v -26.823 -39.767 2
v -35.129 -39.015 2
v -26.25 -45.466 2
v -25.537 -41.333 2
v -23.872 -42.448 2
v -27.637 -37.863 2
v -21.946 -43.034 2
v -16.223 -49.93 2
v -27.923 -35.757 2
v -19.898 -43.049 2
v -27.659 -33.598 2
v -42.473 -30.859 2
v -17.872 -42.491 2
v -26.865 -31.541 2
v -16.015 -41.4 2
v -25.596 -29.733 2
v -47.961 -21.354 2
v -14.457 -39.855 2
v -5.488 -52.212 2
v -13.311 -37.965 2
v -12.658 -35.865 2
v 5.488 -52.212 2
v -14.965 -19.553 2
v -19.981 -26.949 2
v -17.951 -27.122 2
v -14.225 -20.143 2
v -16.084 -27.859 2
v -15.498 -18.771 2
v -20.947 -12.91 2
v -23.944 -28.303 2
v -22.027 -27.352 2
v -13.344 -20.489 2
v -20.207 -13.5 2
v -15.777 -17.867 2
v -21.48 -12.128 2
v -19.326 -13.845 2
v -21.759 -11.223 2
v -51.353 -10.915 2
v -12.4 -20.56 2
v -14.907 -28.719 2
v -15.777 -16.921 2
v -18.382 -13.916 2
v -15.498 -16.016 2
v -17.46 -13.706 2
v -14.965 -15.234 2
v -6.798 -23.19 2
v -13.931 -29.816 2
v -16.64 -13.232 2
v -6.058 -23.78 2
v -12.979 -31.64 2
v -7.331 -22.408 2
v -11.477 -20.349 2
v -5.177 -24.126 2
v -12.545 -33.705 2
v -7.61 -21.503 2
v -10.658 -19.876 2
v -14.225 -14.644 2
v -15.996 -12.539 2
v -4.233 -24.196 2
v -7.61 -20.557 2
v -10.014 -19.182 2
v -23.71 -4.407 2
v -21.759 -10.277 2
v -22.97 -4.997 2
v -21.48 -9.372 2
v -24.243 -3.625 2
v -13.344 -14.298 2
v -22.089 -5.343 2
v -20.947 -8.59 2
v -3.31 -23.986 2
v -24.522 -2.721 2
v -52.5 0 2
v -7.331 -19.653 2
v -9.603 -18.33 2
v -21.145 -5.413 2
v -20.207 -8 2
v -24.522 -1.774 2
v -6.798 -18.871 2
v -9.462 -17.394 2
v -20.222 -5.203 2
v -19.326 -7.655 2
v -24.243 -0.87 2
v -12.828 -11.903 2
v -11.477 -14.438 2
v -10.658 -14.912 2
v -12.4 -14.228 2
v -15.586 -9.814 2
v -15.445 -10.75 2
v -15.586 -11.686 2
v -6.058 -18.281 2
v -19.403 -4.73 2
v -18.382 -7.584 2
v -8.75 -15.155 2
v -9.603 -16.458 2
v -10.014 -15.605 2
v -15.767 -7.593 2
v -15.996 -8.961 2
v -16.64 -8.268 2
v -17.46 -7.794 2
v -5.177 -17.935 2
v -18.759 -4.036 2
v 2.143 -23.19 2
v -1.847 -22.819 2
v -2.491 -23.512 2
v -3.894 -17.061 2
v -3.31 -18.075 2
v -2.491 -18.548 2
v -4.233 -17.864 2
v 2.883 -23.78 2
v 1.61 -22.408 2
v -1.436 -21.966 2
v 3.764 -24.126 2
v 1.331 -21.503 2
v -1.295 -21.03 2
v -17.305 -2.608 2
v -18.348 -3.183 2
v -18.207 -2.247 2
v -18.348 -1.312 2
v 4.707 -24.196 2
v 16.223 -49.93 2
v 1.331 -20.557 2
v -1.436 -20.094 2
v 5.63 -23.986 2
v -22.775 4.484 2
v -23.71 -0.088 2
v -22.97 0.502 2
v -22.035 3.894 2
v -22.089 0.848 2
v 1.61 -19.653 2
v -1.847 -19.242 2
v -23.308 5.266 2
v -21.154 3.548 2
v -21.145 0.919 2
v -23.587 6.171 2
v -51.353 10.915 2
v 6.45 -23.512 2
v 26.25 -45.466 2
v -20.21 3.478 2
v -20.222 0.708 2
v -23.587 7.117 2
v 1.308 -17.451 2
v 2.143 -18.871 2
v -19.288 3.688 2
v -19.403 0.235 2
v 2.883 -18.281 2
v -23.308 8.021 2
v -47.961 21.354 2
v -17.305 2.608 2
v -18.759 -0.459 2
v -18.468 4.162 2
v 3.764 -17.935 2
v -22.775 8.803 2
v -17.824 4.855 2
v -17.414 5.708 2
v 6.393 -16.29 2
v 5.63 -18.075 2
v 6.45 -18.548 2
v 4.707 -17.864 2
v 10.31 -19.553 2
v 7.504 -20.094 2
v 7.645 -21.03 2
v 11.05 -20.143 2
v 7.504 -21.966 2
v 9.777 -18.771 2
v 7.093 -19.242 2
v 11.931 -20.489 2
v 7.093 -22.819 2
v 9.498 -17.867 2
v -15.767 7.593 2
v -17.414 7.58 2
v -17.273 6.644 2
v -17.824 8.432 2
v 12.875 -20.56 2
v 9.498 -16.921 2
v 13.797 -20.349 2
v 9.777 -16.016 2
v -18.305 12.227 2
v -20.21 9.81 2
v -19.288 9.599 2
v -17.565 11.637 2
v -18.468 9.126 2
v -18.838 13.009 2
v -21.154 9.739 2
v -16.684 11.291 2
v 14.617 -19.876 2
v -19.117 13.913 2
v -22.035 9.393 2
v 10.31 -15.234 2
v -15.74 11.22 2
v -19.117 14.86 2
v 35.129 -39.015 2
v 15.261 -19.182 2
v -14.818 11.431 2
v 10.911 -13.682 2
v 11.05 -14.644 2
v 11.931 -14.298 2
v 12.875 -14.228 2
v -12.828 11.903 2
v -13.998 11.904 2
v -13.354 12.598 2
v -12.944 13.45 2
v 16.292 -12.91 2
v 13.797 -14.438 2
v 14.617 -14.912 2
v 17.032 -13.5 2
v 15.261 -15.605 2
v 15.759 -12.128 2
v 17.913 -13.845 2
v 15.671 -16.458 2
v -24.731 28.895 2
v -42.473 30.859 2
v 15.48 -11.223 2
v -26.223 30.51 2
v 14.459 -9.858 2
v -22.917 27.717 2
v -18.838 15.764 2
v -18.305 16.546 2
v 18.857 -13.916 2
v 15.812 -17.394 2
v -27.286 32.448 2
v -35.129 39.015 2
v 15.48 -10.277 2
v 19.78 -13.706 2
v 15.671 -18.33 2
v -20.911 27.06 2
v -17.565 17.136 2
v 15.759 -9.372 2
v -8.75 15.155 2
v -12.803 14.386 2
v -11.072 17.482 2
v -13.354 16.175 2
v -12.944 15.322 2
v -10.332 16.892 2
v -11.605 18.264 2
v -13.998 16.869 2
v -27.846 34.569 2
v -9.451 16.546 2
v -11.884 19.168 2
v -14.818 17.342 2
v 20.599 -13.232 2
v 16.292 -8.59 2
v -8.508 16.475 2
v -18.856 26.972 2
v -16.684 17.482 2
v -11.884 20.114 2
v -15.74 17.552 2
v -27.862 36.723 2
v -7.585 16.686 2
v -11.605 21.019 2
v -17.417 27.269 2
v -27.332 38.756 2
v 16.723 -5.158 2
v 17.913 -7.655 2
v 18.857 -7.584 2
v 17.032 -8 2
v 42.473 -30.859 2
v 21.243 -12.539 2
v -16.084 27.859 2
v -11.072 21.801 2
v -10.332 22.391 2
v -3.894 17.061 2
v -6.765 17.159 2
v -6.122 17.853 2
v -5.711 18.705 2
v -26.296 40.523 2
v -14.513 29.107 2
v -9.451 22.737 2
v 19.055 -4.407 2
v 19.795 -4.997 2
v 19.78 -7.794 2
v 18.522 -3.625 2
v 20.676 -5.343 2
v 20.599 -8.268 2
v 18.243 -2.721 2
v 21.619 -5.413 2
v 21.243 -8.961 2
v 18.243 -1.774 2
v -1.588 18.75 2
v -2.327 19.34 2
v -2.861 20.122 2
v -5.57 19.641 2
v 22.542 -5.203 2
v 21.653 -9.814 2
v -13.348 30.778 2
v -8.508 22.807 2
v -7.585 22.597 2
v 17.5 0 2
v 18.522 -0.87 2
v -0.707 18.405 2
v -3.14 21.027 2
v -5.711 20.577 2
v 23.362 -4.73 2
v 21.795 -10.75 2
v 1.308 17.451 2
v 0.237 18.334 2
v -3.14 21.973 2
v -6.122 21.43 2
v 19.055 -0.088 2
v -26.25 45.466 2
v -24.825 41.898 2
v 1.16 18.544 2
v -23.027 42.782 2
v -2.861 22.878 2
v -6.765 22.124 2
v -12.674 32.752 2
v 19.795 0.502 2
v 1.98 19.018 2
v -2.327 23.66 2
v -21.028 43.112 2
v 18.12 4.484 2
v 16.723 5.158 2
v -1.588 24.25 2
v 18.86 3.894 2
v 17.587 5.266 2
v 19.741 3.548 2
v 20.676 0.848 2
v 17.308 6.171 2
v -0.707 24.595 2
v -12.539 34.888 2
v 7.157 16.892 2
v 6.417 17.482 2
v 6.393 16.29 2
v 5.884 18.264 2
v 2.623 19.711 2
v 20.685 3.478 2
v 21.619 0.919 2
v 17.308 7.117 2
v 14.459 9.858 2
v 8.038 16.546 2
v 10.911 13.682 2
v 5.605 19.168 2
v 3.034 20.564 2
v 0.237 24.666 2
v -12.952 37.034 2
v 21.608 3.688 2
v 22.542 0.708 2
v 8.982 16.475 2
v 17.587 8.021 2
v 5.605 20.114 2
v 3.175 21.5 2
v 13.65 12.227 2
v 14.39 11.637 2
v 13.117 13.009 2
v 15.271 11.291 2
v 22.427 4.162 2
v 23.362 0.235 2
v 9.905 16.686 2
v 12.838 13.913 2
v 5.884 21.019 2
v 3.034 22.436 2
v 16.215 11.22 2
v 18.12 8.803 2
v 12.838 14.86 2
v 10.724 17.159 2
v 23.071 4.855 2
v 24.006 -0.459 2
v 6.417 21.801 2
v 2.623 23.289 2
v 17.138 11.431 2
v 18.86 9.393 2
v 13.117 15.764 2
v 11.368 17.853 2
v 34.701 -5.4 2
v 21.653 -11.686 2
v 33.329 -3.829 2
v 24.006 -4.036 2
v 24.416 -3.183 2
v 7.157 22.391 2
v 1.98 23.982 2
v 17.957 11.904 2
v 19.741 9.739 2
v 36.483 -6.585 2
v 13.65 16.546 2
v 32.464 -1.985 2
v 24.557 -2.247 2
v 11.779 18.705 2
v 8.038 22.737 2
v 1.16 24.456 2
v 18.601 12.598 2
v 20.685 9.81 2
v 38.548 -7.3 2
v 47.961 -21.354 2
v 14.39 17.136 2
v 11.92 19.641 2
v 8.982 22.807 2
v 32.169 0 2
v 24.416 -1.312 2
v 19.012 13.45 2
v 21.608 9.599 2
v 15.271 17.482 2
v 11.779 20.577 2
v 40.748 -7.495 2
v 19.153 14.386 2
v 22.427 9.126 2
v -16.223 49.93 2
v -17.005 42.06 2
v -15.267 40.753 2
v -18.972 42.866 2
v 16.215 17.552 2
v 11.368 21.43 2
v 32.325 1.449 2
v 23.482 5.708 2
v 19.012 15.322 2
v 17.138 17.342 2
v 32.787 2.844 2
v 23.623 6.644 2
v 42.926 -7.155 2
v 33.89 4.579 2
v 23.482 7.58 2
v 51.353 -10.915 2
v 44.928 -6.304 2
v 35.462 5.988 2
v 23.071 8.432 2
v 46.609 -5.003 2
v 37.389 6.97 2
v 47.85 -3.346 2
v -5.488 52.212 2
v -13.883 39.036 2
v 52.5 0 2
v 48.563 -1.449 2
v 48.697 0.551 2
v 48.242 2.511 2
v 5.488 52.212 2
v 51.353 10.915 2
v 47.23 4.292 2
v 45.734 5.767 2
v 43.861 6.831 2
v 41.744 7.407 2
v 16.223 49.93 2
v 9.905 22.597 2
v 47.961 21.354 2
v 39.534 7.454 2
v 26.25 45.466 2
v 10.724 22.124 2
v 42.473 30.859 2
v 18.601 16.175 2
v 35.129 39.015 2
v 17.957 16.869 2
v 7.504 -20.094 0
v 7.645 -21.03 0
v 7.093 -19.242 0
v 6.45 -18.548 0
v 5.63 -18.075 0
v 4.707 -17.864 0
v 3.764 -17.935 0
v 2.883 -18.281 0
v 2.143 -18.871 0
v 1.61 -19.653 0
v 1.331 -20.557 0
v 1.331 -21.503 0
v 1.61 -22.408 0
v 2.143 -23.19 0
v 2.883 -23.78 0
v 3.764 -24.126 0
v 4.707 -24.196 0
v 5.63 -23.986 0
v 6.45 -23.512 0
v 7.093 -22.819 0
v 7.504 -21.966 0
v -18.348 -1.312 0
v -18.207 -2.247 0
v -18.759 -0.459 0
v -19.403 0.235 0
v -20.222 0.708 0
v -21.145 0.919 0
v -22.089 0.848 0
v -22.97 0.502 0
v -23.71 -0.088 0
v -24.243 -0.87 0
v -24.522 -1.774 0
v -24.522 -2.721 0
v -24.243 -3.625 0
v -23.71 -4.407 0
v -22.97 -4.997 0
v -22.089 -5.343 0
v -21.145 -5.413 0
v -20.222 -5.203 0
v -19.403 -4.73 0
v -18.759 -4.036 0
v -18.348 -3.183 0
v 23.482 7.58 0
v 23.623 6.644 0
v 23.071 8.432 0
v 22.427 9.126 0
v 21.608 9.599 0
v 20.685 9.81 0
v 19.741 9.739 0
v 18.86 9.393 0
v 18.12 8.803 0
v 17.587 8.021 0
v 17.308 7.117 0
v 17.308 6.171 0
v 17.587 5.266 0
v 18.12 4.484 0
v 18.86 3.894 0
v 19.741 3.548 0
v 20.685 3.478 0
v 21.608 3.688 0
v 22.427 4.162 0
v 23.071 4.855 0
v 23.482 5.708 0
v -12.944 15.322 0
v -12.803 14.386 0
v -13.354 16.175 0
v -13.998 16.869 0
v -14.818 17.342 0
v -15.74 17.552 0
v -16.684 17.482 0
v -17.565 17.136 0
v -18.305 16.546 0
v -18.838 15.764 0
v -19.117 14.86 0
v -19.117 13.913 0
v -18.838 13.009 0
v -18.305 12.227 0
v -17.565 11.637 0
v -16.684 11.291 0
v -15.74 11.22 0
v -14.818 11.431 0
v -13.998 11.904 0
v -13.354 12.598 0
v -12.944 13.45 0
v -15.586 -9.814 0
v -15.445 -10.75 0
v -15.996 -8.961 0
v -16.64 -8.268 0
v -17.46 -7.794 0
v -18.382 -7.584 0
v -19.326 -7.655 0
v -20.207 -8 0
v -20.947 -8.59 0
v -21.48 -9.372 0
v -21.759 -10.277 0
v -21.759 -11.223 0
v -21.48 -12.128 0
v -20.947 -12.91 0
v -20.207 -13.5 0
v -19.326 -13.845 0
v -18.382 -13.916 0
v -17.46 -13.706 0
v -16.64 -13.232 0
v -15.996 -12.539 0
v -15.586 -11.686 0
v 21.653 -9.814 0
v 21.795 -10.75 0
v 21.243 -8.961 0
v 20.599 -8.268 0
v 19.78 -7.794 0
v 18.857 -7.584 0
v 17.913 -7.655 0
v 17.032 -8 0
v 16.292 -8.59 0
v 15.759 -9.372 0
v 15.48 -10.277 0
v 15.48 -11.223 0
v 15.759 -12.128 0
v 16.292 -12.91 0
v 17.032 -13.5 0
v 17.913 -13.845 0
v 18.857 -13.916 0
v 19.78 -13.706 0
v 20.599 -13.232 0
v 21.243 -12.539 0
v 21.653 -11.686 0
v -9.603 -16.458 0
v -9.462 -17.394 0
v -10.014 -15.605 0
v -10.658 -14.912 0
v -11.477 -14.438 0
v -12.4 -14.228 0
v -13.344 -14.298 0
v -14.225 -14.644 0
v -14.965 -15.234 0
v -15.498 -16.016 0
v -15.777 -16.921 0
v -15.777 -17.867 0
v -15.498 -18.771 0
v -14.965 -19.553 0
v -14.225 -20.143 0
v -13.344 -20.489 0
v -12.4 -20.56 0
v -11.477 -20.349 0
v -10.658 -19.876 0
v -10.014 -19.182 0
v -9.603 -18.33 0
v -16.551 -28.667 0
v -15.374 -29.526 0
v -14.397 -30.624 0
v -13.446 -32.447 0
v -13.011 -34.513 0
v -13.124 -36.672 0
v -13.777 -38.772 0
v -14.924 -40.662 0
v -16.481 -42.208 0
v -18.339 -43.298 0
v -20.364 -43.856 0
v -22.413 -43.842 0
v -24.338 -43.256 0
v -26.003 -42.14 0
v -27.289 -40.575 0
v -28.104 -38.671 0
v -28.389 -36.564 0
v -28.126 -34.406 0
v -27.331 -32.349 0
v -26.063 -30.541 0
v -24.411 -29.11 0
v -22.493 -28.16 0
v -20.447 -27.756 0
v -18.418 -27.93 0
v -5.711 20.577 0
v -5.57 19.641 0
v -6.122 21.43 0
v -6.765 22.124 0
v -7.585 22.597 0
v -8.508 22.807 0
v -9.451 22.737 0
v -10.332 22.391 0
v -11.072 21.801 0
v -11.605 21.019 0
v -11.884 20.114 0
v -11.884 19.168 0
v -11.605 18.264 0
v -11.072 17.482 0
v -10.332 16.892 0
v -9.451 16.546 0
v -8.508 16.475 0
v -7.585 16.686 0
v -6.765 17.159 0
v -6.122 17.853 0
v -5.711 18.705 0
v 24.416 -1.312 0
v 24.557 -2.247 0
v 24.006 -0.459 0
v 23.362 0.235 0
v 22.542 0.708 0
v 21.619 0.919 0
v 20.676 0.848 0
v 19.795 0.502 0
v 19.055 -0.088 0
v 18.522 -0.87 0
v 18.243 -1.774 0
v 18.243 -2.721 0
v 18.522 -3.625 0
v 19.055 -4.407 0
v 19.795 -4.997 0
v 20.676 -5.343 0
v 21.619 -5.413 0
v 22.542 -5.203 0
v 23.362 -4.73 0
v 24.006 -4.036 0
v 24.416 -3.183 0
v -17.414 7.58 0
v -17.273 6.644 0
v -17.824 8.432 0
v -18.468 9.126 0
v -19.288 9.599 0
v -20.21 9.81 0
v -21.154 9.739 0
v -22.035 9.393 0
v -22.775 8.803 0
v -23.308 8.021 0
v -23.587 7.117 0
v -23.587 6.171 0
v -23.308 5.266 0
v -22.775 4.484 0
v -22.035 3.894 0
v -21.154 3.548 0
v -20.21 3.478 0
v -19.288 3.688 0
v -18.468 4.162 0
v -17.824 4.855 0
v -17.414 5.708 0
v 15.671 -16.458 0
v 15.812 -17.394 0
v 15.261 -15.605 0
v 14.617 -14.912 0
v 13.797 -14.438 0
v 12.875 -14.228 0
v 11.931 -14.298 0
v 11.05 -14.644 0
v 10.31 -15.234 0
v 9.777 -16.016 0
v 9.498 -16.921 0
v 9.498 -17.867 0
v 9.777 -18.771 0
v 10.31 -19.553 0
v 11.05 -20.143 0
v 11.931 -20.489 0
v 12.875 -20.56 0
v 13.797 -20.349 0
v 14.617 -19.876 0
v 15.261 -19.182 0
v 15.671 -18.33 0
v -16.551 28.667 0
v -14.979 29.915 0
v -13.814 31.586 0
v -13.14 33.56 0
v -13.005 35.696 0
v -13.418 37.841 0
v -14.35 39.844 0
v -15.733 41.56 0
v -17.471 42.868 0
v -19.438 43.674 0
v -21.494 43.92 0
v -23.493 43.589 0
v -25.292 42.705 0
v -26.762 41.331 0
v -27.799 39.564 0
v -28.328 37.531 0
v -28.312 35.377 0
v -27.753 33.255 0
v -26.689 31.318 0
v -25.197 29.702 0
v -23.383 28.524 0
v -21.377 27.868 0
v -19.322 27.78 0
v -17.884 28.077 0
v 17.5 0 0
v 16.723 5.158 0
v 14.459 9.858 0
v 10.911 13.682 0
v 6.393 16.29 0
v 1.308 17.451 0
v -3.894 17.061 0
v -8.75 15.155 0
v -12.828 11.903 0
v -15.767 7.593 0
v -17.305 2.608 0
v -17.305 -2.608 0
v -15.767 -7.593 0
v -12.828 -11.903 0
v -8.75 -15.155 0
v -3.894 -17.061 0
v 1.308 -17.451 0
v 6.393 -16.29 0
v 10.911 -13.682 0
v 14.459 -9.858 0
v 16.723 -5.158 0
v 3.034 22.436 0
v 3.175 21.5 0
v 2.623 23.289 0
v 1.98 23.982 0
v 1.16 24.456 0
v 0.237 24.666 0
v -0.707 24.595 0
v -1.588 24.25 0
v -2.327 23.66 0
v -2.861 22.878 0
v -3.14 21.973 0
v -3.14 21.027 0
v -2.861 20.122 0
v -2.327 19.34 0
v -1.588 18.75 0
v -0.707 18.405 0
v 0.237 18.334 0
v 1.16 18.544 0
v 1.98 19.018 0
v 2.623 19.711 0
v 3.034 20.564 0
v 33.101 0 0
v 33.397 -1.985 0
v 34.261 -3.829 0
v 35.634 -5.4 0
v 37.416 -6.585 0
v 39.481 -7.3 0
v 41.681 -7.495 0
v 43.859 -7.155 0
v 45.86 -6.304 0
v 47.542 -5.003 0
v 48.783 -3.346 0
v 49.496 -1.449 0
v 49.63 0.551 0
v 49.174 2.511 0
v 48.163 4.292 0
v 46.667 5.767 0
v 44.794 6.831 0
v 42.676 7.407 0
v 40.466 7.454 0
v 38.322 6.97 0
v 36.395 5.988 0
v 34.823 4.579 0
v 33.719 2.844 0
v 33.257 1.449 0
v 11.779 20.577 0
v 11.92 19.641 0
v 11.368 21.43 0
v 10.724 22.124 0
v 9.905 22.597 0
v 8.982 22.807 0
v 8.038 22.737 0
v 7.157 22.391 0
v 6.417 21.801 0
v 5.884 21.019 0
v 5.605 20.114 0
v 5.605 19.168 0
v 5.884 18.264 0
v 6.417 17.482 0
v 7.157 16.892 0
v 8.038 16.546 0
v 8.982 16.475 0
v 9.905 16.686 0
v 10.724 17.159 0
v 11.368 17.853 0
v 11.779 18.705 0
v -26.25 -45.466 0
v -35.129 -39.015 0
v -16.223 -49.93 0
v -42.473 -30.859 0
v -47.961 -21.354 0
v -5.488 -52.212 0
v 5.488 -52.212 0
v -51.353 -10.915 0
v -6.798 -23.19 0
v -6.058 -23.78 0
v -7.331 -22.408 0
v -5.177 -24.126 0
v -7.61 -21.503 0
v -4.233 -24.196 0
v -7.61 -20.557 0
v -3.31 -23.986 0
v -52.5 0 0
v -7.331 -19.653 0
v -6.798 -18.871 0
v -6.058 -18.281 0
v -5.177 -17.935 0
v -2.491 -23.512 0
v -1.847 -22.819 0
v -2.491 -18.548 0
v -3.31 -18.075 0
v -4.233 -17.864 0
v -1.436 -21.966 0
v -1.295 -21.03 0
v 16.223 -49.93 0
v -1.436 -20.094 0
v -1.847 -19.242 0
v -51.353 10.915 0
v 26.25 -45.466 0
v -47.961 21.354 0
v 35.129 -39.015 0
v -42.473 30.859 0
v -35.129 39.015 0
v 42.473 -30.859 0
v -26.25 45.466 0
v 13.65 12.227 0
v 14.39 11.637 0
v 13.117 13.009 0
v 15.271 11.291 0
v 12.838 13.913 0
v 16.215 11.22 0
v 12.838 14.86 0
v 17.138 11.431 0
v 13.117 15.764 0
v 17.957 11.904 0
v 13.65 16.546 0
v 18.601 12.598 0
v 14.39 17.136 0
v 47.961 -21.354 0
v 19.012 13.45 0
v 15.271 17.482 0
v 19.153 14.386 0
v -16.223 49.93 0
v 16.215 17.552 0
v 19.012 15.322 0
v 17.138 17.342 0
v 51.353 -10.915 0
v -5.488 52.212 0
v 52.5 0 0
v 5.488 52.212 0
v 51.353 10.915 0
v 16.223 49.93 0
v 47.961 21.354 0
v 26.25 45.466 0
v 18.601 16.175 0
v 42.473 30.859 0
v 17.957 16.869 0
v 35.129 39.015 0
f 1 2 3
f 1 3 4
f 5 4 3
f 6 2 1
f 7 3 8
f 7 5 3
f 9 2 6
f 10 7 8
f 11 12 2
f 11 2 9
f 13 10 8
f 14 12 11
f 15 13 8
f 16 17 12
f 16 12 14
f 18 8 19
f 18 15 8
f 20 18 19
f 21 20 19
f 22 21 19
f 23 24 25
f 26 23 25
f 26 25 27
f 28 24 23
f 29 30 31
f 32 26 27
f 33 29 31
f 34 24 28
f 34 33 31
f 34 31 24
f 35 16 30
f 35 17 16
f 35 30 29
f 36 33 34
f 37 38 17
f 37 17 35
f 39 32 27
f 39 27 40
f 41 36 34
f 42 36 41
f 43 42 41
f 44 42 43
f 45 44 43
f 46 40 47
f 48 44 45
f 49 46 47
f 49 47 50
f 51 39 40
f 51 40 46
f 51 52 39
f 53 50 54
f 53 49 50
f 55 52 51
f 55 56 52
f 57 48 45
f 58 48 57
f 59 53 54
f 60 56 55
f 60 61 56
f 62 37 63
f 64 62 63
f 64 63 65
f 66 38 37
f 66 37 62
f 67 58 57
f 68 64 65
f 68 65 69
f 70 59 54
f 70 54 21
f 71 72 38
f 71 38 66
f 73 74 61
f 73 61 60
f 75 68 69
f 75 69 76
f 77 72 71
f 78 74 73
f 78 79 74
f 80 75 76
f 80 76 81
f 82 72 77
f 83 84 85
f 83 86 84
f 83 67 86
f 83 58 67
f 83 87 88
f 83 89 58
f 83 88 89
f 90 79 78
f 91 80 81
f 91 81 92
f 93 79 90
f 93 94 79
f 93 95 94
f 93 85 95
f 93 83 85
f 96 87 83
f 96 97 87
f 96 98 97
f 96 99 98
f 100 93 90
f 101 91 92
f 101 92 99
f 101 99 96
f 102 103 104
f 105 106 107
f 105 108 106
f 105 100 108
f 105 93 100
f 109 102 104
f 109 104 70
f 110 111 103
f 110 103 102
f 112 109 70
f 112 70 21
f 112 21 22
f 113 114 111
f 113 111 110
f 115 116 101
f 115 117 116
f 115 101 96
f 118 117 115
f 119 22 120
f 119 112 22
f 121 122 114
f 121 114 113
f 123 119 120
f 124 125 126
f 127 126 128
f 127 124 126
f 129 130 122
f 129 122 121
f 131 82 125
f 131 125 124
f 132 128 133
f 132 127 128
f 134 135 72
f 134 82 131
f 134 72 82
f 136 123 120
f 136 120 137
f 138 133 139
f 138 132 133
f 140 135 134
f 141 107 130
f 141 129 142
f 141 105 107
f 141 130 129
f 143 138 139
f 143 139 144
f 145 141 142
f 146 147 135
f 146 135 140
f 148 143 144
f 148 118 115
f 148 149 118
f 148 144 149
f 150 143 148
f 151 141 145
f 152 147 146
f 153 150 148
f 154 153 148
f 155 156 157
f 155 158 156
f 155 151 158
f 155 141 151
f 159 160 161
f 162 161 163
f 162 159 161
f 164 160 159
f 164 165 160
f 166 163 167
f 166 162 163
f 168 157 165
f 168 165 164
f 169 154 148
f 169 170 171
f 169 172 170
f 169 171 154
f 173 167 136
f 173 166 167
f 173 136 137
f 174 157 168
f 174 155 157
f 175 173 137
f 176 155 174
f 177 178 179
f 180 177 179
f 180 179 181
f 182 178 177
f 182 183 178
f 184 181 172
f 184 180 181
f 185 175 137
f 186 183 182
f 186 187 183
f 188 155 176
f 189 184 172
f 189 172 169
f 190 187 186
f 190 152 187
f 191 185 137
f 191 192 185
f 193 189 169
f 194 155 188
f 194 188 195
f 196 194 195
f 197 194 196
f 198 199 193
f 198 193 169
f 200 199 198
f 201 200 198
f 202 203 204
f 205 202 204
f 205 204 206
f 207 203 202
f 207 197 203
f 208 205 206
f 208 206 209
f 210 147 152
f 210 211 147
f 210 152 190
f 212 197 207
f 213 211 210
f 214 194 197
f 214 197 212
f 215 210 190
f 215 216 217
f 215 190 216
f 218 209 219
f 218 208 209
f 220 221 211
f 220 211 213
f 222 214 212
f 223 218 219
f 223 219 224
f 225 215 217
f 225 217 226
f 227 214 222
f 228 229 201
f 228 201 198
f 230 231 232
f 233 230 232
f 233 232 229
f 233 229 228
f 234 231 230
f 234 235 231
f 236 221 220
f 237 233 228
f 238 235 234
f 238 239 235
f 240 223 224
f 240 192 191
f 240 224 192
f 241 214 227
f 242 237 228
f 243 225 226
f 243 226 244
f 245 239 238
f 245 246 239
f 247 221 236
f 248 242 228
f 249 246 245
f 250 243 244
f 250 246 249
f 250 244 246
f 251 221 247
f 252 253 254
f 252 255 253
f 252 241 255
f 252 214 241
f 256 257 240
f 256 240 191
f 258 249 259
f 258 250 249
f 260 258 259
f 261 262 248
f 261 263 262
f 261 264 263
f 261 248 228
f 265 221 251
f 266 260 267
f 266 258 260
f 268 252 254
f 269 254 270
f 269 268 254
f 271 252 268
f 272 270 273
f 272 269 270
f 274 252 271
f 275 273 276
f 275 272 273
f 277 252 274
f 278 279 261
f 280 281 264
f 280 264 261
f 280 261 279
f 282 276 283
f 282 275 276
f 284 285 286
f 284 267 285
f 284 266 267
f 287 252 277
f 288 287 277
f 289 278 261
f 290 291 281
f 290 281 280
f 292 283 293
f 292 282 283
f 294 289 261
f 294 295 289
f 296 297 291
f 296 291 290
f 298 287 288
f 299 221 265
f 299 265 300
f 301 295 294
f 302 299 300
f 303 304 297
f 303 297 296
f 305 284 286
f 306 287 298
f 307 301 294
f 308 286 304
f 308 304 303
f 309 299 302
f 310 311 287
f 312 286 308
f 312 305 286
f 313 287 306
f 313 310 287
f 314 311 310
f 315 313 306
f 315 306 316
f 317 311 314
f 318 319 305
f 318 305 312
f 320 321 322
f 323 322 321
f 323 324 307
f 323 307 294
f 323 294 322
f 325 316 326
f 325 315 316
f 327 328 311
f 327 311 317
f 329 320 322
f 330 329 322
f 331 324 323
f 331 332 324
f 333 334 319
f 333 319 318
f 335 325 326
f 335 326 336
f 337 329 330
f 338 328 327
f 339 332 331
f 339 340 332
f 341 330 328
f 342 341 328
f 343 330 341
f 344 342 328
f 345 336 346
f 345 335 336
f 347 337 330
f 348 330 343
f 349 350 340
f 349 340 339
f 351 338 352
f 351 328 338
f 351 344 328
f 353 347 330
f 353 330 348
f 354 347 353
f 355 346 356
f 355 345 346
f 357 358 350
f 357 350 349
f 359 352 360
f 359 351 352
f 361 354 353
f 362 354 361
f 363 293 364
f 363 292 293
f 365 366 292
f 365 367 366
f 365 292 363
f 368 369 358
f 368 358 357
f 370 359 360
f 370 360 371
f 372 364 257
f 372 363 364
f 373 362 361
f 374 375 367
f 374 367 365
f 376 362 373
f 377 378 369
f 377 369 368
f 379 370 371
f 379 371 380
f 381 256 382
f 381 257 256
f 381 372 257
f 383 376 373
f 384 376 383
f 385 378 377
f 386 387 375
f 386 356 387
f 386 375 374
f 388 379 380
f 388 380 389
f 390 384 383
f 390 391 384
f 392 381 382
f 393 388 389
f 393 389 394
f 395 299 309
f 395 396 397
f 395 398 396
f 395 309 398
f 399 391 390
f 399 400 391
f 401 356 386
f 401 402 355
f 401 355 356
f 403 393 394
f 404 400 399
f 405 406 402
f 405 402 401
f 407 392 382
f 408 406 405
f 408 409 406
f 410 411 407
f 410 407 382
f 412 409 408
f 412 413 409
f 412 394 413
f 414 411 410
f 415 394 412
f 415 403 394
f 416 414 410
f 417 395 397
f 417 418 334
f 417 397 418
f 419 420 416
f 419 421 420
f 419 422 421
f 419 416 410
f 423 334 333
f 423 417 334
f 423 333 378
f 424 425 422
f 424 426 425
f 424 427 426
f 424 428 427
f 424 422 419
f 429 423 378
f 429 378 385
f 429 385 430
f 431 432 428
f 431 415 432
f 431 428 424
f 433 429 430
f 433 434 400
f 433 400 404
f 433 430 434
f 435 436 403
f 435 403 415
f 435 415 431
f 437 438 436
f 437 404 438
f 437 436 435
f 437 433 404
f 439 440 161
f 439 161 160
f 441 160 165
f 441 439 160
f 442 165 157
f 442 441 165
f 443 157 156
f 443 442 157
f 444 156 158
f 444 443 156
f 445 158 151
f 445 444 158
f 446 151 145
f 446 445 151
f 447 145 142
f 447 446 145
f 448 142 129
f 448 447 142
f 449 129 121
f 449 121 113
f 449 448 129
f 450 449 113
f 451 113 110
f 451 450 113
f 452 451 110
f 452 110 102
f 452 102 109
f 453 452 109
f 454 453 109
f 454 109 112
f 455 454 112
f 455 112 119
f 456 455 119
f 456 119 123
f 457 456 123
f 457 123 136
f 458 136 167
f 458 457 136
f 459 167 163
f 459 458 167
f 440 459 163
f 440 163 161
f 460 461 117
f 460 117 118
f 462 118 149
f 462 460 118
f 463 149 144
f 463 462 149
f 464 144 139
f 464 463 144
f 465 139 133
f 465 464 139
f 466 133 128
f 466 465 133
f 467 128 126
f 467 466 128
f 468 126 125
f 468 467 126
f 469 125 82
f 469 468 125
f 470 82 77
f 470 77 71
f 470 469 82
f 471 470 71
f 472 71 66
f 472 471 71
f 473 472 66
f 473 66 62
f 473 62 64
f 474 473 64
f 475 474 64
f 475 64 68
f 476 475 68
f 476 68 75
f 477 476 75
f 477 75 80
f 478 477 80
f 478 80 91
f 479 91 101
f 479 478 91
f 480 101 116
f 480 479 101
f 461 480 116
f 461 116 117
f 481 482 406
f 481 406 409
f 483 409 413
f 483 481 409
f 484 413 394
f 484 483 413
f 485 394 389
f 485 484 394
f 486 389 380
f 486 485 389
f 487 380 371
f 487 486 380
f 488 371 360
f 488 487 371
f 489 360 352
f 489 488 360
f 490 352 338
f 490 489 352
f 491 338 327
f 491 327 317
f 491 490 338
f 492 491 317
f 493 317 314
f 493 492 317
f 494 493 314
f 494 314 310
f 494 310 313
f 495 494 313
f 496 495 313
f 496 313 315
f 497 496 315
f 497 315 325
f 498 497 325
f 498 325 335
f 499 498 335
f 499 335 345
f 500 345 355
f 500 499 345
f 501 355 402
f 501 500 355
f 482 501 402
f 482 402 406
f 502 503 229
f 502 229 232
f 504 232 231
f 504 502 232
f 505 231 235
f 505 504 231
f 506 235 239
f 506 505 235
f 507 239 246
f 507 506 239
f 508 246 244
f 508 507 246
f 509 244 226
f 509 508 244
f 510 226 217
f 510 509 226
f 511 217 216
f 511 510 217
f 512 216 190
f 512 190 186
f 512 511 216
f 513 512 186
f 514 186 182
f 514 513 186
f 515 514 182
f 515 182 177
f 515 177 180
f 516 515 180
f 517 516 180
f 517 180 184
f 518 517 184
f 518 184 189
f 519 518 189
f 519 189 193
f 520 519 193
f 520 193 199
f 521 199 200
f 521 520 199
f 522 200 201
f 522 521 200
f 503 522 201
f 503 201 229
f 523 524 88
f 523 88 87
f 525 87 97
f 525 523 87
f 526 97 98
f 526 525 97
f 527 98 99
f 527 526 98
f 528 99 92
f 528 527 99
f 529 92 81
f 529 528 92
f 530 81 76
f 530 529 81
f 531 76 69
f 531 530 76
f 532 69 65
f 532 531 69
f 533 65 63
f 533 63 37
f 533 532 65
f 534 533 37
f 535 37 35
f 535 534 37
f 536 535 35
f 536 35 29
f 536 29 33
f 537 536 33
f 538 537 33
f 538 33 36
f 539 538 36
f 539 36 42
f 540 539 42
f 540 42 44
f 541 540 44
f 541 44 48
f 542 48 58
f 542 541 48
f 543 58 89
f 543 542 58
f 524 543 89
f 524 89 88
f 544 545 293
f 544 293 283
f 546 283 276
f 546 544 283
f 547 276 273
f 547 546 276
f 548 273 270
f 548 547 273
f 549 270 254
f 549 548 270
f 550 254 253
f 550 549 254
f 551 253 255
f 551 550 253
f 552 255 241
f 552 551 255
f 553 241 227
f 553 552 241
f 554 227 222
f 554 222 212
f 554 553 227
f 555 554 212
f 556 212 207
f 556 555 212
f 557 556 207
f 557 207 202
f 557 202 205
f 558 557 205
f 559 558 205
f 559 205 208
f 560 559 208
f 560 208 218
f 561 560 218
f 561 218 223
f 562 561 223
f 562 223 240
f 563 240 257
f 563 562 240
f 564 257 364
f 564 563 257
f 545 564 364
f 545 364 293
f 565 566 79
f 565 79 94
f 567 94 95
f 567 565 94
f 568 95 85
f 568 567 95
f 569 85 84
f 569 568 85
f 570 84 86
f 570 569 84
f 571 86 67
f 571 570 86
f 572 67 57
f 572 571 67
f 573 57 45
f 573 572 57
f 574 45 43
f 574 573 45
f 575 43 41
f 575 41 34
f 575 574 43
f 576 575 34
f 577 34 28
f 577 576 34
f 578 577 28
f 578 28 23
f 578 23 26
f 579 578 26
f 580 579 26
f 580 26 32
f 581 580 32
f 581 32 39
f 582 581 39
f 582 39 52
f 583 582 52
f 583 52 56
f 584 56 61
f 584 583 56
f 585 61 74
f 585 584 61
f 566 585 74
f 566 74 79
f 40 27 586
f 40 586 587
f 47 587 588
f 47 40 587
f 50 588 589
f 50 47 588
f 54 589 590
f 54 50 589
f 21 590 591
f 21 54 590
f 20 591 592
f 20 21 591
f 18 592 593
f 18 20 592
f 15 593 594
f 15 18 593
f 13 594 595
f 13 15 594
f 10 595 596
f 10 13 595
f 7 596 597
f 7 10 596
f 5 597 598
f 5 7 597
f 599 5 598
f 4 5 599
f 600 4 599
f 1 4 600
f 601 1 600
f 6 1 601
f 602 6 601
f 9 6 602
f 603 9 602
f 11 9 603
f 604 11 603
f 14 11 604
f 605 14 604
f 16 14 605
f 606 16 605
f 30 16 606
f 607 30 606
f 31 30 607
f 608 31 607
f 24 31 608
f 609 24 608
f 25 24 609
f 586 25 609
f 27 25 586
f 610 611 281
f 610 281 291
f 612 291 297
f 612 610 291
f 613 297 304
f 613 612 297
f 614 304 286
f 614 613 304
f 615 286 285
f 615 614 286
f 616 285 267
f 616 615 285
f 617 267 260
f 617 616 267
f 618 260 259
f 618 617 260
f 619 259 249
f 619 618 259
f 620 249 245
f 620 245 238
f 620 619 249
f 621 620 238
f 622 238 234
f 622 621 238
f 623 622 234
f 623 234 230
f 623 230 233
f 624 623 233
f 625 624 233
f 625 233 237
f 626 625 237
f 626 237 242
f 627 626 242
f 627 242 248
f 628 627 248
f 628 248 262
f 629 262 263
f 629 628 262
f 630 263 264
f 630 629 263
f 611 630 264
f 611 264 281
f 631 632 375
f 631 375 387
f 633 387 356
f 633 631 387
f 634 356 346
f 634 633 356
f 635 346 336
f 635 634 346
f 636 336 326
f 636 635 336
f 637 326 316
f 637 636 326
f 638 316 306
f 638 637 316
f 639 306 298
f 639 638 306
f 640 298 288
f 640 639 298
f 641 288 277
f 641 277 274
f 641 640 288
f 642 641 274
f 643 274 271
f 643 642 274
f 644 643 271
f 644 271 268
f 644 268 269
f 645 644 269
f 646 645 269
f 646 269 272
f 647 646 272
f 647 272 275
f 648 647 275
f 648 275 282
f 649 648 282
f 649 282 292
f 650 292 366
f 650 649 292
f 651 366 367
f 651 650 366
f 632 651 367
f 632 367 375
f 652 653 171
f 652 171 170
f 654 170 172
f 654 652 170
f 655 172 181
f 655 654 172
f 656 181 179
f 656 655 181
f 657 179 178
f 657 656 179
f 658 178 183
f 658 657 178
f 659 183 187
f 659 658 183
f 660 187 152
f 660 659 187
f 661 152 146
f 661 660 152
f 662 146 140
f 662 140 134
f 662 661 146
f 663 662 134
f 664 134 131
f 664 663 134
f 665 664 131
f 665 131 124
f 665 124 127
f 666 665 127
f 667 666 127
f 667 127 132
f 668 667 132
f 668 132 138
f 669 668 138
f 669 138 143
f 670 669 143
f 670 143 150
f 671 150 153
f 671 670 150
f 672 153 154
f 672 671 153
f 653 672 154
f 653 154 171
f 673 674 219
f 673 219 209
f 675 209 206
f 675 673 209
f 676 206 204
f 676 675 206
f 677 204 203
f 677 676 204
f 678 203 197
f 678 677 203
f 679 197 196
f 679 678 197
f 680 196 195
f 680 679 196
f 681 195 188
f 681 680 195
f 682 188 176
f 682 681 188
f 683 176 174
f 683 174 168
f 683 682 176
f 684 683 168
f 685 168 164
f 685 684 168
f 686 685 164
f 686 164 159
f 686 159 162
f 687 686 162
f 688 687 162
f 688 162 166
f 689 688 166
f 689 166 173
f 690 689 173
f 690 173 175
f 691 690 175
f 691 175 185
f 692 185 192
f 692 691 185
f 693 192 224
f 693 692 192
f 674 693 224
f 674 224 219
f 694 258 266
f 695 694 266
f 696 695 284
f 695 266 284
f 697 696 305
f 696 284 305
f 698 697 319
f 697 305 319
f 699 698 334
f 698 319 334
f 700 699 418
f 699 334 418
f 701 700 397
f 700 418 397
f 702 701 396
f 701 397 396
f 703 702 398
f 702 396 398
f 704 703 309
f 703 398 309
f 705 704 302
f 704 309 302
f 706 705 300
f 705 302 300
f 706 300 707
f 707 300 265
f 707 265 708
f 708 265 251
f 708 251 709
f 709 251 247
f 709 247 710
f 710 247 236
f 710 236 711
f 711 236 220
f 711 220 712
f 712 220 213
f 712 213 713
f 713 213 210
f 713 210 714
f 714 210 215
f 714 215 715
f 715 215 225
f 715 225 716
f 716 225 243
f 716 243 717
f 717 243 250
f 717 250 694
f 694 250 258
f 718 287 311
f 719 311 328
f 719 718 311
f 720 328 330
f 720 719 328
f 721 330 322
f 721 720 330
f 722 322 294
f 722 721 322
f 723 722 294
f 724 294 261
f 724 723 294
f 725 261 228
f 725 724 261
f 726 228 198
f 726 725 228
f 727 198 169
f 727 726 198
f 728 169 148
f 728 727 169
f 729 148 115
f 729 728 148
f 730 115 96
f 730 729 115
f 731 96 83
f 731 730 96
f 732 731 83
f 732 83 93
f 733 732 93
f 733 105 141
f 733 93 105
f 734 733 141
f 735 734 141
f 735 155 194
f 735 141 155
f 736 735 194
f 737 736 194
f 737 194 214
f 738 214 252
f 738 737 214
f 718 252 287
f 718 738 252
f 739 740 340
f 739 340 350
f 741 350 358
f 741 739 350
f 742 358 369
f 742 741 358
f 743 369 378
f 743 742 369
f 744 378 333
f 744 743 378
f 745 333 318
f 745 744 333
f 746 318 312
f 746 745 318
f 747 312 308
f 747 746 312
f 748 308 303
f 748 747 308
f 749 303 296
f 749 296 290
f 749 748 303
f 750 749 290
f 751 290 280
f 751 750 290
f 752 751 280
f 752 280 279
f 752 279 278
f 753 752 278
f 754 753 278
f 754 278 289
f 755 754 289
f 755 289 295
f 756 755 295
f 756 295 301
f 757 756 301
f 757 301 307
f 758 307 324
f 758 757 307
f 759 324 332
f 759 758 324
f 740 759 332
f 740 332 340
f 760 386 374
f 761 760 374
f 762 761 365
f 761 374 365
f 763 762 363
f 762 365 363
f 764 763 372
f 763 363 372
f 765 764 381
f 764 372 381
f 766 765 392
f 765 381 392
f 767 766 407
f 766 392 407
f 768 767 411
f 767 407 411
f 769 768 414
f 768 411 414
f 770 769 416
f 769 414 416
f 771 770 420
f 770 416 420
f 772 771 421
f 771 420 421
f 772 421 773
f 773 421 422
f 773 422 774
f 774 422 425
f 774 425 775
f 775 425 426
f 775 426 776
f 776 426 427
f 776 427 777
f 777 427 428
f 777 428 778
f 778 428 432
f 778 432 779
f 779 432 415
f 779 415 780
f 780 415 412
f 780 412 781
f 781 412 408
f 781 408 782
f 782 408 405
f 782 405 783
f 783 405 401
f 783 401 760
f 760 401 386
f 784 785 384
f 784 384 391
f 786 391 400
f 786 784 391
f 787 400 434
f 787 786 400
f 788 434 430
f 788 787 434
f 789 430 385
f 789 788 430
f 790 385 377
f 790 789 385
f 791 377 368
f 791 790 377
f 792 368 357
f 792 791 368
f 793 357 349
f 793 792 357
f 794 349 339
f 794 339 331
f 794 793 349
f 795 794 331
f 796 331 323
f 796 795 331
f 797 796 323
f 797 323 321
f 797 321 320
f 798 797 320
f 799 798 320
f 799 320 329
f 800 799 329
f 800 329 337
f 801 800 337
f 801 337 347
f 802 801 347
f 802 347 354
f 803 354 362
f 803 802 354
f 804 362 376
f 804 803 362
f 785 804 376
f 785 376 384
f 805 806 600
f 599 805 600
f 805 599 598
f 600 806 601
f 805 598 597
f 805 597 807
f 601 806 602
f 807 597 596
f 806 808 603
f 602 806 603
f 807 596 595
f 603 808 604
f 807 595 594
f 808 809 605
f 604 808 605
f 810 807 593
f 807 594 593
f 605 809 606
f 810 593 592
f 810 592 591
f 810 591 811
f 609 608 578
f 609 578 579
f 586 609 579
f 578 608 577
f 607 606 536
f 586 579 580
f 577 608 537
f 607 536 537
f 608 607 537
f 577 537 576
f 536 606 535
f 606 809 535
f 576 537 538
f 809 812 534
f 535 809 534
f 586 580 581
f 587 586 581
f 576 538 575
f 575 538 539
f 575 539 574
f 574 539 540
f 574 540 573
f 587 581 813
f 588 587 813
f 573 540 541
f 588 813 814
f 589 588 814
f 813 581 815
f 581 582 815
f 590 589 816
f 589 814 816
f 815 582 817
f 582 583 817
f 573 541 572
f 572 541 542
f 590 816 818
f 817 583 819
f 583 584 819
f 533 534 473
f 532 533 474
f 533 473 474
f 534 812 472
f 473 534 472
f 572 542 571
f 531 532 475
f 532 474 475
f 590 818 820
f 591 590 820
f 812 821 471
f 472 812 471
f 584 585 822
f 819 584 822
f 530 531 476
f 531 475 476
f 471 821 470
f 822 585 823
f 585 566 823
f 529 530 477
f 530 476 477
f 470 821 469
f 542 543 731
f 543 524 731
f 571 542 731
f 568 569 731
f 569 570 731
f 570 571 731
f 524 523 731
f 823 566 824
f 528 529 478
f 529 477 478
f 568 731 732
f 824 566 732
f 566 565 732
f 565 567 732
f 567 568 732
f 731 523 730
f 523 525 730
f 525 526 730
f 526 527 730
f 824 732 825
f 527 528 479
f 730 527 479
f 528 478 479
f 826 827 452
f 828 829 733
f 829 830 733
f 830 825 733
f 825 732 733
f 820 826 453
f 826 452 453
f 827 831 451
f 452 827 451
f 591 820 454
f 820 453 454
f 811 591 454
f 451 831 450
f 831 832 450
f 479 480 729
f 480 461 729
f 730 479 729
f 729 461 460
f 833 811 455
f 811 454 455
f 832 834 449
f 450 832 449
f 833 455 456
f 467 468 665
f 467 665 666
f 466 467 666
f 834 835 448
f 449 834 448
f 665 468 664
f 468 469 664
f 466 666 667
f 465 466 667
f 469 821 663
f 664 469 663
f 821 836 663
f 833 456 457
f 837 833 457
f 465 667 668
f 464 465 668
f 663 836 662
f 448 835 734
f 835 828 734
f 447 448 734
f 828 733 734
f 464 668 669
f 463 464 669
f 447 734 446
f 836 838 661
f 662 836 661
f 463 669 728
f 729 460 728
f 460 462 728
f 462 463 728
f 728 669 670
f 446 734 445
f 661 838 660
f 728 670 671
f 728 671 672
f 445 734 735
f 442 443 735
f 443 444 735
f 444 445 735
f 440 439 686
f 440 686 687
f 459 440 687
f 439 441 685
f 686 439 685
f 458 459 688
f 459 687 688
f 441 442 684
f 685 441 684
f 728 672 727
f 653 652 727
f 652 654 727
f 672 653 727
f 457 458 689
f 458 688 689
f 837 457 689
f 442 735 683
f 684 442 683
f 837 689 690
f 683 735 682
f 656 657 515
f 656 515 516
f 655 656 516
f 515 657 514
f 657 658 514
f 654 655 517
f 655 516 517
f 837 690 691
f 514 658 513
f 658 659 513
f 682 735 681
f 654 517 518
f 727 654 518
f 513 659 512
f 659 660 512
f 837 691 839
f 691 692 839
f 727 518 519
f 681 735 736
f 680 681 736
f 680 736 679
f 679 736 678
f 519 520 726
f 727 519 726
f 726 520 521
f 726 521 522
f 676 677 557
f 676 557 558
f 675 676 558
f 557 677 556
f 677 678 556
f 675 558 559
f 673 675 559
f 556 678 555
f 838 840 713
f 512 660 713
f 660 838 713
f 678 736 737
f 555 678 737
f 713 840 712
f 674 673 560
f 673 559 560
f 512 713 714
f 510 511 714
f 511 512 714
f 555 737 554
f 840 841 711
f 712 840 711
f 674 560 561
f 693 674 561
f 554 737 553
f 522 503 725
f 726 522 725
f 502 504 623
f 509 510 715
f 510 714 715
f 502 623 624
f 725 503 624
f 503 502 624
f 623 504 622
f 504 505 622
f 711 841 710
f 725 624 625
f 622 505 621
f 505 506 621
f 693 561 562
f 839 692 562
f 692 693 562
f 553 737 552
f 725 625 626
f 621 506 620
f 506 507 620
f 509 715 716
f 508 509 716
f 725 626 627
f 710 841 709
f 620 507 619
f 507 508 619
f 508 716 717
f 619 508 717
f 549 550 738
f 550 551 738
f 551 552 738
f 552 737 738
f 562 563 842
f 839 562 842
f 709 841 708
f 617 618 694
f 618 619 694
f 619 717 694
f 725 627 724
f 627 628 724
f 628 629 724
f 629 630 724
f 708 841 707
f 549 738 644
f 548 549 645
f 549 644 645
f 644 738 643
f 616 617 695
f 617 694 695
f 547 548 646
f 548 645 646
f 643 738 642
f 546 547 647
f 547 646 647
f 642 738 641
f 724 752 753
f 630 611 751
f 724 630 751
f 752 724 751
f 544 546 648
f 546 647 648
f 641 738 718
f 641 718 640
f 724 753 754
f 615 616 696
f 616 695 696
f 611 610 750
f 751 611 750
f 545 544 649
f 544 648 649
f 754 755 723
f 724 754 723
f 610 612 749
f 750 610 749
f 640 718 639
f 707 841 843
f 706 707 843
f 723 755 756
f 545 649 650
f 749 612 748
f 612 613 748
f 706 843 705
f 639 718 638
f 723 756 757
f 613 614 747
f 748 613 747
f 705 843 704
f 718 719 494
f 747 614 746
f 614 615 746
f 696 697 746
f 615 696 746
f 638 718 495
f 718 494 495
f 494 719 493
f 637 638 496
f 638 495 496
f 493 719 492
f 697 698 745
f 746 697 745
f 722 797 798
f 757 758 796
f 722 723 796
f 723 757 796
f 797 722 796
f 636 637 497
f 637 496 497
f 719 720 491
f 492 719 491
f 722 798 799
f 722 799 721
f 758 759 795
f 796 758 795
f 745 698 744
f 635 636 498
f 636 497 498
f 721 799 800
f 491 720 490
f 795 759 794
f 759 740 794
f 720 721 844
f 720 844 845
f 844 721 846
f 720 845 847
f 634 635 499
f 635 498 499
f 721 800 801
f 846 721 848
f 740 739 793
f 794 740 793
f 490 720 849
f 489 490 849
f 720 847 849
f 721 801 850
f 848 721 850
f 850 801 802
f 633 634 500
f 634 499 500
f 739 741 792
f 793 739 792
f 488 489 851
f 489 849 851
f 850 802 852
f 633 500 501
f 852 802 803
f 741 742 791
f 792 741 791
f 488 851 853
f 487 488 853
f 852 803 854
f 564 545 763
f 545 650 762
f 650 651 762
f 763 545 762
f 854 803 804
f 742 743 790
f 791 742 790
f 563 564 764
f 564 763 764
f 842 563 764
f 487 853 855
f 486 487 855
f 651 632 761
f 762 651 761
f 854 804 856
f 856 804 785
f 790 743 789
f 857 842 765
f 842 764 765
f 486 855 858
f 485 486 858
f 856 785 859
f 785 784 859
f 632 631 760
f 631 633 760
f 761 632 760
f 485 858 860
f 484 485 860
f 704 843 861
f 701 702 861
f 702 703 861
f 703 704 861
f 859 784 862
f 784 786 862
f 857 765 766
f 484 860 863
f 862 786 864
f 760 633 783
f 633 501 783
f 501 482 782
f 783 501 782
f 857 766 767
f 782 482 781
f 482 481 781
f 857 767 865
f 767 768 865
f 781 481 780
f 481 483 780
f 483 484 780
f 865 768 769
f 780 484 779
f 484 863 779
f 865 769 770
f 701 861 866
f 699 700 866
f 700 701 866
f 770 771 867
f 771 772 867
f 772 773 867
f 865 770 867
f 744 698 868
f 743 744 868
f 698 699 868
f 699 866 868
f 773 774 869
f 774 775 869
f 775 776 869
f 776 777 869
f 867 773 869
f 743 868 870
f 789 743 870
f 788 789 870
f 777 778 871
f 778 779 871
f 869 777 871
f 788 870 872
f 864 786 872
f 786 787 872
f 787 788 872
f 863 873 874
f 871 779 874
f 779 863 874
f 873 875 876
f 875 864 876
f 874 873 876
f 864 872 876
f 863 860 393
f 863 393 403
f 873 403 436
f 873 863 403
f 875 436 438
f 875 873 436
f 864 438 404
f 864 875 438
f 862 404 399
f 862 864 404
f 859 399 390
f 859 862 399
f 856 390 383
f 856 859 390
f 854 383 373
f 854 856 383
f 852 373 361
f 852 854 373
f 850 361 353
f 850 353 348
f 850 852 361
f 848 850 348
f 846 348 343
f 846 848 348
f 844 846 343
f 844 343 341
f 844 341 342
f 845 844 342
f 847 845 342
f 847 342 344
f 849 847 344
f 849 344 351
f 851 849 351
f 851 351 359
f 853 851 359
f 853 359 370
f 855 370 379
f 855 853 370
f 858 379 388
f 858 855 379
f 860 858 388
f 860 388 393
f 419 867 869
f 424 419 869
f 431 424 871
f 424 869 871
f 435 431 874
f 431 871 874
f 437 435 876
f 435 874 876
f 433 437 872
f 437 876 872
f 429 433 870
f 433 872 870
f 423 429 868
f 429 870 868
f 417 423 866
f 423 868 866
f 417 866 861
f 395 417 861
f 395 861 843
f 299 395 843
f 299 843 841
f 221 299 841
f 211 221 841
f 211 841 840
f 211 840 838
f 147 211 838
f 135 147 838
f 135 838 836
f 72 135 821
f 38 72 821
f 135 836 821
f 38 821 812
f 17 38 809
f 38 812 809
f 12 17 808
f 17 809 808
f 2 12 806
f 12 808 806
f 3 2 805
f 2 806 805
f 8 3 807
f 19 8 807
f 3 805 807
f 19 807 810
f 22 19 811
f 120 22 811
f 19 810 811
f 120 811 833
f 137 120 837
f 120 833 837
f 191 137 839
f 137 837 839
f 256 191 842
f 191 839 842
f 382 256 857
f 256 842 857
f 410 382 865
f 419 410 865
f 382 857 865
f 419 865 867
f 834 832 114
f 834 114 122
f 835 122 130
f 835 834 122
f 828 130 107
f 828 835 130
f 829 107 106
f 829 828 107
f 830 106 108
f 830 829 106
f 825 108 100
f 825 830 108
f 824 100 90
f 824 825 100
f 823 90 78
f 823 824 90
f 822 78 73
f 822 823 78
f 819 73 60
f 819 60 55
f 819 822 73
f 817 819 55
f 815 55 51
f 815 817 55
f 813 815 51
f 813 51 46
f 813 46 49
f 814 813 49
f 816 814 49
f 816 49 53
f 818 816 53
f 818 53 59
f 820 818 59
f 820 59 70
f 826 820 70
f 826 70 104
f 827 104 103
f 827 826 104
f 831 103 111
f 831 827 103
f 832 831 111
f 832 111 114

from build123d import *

# Parameters (mm, degrees)
SKETCH1_R           = 52.5
BOSS_EXTRUDE2_DEPTH = 2
SKETCH4_R           = 3.175
CUT_EXTRUDE2_DEPTH  = 2
SKETCH5_R           = 7.5
CUT_EXTRUDE3_DEPTH  = 102
SKETCH6_R           = 7.5
CUT_EXTRUDE4_DEPTH  = 102
SKETCH7_R           = 7.5
CUT_EXTRUDE5_DEPTH  = 102
SKETCH8_R           = 17.5
CUT_EXTRUDE6_DEPTH  = 10


with BuildPart() as part:
    # Sketch1 → Boss-Extrude2 (new body)
    with BuildSketch(Plane.XY):
        Circle(SKETCH1_R)
    extrude(amount=BOSS_EXTRUDE2_DEPTH)

    # Sketch4 → Cut-Extrude2 (cut)
    with BuildSketch(Plane.XY):
        with Locations((0, 21.5)):
            Circle(SKETCH4_R)
        with Locations((8.744837826, 19.641227339)):
            Circle(SKETCH4_R)
        with Locations((15.977613748, 14.386308037)):
            Circle(SKETCH4_R)
        with Locations((20.4477151, 6.643865379)):
            Circle(SKETCH4_R)
        with Locations((21.38222075, -2.24736196)):
            Circle(SKETCH4_R)
        with Locations((18.619546181, -10.75)):
            Circle(SKETCH4_R)
        with Locations((12.637382924, -17.393865379)):
            Circle(SKETCH4_R)
        with Locations((4.470101353, -21.030173416)):
            Circle(SKETCH4_R)
        with Locations((-4.470101353, -21.030173416)):
            Circle(SKETCH4_R)
        with Locations((-12.637382924, -17.393865379)):
            Circle(SKETCH4_R)
        with Locations((-18.619546181, -10.75)):
            Circle(SKETCH4_R)
        with Locations((-21.38222075, -2.24736196)):
            Circle(SKETCH4_R)
        with Locations((-20.4477151, 6.643865379)):
            Circle(SKETCH4_R)
        with Locations((-15.977613748, 14.386308037)):
            Circle(SKETCH4_R)
        with Locations((-8.744837826, 19.641227339)):
            Circle(SKETCH4_R)
    extrude(amount=CUT_EXTRUDE2_DEPTH, mode=Mode.SUBTRACT)

    # Sketch5 → Cut-Extrude3 (cut)
    with BuildSketch(Plane(origin=(-10.124934849, 0, 21.712992854), x_dir=(0, -1, 0), z_dir=(-0.4226182617407003, 0, 0.9063077870366496))):
        with Locations(Location((0, 37.5, 0), (0, 0, 270))):
            Circle(SKETCH5_R)
    extrude(amount=-CUT_EXTRUDE3_DEPTH, mode=Mode.SUBTRACT)

    # Sketch6 → Cut-Extrude4 (cut)
    with BuildSketch(Plane(origin=(6.212874781, 10.761014782, 26.647105929), x_dir=(0.86602540378444, -0.4999999999999977, 0), z_dir=(-0.21130913087034603, -0.36599815077066267, -0.9063077870366526))):
        with Locations(Location((0, 37.5, 0), (0, 0, 270))):
            Circle(SKETCH6_R)
    extrude(amount=CUT_EXTRUDE4_DEPTH, mode=Mode.SUBTRACT)

    # Sketch7 → Cut-Extrude5 (cut)
    with BuildSketch(Plane(origin=(6.212874781, -10.761014782, 26.647105929), x_dir=(0.8660254037844399, 0.4999999999999978, 0), z_dir=(0.2113091308703492, -0.36599815077066805, 0.9063077870366496))):
        with Locations(Location((0, 37.5, 0), (0, 0, 270))):
            Circle(SKETCH7_R)
    extrude(amount=-CUT_EXTRUDE5_DEPTH, mode=Mode.SUBTRACT)

    # Sketch8 → Cut-Extrude6 (cut)
    with BuildSketch(Plane.XY):
        Circle(SKETCH8_R)
    extrude(amount=CUT_EXTRUDE6_DEPTH, mode=Mode.SUBTRACT)


solid = part.part
